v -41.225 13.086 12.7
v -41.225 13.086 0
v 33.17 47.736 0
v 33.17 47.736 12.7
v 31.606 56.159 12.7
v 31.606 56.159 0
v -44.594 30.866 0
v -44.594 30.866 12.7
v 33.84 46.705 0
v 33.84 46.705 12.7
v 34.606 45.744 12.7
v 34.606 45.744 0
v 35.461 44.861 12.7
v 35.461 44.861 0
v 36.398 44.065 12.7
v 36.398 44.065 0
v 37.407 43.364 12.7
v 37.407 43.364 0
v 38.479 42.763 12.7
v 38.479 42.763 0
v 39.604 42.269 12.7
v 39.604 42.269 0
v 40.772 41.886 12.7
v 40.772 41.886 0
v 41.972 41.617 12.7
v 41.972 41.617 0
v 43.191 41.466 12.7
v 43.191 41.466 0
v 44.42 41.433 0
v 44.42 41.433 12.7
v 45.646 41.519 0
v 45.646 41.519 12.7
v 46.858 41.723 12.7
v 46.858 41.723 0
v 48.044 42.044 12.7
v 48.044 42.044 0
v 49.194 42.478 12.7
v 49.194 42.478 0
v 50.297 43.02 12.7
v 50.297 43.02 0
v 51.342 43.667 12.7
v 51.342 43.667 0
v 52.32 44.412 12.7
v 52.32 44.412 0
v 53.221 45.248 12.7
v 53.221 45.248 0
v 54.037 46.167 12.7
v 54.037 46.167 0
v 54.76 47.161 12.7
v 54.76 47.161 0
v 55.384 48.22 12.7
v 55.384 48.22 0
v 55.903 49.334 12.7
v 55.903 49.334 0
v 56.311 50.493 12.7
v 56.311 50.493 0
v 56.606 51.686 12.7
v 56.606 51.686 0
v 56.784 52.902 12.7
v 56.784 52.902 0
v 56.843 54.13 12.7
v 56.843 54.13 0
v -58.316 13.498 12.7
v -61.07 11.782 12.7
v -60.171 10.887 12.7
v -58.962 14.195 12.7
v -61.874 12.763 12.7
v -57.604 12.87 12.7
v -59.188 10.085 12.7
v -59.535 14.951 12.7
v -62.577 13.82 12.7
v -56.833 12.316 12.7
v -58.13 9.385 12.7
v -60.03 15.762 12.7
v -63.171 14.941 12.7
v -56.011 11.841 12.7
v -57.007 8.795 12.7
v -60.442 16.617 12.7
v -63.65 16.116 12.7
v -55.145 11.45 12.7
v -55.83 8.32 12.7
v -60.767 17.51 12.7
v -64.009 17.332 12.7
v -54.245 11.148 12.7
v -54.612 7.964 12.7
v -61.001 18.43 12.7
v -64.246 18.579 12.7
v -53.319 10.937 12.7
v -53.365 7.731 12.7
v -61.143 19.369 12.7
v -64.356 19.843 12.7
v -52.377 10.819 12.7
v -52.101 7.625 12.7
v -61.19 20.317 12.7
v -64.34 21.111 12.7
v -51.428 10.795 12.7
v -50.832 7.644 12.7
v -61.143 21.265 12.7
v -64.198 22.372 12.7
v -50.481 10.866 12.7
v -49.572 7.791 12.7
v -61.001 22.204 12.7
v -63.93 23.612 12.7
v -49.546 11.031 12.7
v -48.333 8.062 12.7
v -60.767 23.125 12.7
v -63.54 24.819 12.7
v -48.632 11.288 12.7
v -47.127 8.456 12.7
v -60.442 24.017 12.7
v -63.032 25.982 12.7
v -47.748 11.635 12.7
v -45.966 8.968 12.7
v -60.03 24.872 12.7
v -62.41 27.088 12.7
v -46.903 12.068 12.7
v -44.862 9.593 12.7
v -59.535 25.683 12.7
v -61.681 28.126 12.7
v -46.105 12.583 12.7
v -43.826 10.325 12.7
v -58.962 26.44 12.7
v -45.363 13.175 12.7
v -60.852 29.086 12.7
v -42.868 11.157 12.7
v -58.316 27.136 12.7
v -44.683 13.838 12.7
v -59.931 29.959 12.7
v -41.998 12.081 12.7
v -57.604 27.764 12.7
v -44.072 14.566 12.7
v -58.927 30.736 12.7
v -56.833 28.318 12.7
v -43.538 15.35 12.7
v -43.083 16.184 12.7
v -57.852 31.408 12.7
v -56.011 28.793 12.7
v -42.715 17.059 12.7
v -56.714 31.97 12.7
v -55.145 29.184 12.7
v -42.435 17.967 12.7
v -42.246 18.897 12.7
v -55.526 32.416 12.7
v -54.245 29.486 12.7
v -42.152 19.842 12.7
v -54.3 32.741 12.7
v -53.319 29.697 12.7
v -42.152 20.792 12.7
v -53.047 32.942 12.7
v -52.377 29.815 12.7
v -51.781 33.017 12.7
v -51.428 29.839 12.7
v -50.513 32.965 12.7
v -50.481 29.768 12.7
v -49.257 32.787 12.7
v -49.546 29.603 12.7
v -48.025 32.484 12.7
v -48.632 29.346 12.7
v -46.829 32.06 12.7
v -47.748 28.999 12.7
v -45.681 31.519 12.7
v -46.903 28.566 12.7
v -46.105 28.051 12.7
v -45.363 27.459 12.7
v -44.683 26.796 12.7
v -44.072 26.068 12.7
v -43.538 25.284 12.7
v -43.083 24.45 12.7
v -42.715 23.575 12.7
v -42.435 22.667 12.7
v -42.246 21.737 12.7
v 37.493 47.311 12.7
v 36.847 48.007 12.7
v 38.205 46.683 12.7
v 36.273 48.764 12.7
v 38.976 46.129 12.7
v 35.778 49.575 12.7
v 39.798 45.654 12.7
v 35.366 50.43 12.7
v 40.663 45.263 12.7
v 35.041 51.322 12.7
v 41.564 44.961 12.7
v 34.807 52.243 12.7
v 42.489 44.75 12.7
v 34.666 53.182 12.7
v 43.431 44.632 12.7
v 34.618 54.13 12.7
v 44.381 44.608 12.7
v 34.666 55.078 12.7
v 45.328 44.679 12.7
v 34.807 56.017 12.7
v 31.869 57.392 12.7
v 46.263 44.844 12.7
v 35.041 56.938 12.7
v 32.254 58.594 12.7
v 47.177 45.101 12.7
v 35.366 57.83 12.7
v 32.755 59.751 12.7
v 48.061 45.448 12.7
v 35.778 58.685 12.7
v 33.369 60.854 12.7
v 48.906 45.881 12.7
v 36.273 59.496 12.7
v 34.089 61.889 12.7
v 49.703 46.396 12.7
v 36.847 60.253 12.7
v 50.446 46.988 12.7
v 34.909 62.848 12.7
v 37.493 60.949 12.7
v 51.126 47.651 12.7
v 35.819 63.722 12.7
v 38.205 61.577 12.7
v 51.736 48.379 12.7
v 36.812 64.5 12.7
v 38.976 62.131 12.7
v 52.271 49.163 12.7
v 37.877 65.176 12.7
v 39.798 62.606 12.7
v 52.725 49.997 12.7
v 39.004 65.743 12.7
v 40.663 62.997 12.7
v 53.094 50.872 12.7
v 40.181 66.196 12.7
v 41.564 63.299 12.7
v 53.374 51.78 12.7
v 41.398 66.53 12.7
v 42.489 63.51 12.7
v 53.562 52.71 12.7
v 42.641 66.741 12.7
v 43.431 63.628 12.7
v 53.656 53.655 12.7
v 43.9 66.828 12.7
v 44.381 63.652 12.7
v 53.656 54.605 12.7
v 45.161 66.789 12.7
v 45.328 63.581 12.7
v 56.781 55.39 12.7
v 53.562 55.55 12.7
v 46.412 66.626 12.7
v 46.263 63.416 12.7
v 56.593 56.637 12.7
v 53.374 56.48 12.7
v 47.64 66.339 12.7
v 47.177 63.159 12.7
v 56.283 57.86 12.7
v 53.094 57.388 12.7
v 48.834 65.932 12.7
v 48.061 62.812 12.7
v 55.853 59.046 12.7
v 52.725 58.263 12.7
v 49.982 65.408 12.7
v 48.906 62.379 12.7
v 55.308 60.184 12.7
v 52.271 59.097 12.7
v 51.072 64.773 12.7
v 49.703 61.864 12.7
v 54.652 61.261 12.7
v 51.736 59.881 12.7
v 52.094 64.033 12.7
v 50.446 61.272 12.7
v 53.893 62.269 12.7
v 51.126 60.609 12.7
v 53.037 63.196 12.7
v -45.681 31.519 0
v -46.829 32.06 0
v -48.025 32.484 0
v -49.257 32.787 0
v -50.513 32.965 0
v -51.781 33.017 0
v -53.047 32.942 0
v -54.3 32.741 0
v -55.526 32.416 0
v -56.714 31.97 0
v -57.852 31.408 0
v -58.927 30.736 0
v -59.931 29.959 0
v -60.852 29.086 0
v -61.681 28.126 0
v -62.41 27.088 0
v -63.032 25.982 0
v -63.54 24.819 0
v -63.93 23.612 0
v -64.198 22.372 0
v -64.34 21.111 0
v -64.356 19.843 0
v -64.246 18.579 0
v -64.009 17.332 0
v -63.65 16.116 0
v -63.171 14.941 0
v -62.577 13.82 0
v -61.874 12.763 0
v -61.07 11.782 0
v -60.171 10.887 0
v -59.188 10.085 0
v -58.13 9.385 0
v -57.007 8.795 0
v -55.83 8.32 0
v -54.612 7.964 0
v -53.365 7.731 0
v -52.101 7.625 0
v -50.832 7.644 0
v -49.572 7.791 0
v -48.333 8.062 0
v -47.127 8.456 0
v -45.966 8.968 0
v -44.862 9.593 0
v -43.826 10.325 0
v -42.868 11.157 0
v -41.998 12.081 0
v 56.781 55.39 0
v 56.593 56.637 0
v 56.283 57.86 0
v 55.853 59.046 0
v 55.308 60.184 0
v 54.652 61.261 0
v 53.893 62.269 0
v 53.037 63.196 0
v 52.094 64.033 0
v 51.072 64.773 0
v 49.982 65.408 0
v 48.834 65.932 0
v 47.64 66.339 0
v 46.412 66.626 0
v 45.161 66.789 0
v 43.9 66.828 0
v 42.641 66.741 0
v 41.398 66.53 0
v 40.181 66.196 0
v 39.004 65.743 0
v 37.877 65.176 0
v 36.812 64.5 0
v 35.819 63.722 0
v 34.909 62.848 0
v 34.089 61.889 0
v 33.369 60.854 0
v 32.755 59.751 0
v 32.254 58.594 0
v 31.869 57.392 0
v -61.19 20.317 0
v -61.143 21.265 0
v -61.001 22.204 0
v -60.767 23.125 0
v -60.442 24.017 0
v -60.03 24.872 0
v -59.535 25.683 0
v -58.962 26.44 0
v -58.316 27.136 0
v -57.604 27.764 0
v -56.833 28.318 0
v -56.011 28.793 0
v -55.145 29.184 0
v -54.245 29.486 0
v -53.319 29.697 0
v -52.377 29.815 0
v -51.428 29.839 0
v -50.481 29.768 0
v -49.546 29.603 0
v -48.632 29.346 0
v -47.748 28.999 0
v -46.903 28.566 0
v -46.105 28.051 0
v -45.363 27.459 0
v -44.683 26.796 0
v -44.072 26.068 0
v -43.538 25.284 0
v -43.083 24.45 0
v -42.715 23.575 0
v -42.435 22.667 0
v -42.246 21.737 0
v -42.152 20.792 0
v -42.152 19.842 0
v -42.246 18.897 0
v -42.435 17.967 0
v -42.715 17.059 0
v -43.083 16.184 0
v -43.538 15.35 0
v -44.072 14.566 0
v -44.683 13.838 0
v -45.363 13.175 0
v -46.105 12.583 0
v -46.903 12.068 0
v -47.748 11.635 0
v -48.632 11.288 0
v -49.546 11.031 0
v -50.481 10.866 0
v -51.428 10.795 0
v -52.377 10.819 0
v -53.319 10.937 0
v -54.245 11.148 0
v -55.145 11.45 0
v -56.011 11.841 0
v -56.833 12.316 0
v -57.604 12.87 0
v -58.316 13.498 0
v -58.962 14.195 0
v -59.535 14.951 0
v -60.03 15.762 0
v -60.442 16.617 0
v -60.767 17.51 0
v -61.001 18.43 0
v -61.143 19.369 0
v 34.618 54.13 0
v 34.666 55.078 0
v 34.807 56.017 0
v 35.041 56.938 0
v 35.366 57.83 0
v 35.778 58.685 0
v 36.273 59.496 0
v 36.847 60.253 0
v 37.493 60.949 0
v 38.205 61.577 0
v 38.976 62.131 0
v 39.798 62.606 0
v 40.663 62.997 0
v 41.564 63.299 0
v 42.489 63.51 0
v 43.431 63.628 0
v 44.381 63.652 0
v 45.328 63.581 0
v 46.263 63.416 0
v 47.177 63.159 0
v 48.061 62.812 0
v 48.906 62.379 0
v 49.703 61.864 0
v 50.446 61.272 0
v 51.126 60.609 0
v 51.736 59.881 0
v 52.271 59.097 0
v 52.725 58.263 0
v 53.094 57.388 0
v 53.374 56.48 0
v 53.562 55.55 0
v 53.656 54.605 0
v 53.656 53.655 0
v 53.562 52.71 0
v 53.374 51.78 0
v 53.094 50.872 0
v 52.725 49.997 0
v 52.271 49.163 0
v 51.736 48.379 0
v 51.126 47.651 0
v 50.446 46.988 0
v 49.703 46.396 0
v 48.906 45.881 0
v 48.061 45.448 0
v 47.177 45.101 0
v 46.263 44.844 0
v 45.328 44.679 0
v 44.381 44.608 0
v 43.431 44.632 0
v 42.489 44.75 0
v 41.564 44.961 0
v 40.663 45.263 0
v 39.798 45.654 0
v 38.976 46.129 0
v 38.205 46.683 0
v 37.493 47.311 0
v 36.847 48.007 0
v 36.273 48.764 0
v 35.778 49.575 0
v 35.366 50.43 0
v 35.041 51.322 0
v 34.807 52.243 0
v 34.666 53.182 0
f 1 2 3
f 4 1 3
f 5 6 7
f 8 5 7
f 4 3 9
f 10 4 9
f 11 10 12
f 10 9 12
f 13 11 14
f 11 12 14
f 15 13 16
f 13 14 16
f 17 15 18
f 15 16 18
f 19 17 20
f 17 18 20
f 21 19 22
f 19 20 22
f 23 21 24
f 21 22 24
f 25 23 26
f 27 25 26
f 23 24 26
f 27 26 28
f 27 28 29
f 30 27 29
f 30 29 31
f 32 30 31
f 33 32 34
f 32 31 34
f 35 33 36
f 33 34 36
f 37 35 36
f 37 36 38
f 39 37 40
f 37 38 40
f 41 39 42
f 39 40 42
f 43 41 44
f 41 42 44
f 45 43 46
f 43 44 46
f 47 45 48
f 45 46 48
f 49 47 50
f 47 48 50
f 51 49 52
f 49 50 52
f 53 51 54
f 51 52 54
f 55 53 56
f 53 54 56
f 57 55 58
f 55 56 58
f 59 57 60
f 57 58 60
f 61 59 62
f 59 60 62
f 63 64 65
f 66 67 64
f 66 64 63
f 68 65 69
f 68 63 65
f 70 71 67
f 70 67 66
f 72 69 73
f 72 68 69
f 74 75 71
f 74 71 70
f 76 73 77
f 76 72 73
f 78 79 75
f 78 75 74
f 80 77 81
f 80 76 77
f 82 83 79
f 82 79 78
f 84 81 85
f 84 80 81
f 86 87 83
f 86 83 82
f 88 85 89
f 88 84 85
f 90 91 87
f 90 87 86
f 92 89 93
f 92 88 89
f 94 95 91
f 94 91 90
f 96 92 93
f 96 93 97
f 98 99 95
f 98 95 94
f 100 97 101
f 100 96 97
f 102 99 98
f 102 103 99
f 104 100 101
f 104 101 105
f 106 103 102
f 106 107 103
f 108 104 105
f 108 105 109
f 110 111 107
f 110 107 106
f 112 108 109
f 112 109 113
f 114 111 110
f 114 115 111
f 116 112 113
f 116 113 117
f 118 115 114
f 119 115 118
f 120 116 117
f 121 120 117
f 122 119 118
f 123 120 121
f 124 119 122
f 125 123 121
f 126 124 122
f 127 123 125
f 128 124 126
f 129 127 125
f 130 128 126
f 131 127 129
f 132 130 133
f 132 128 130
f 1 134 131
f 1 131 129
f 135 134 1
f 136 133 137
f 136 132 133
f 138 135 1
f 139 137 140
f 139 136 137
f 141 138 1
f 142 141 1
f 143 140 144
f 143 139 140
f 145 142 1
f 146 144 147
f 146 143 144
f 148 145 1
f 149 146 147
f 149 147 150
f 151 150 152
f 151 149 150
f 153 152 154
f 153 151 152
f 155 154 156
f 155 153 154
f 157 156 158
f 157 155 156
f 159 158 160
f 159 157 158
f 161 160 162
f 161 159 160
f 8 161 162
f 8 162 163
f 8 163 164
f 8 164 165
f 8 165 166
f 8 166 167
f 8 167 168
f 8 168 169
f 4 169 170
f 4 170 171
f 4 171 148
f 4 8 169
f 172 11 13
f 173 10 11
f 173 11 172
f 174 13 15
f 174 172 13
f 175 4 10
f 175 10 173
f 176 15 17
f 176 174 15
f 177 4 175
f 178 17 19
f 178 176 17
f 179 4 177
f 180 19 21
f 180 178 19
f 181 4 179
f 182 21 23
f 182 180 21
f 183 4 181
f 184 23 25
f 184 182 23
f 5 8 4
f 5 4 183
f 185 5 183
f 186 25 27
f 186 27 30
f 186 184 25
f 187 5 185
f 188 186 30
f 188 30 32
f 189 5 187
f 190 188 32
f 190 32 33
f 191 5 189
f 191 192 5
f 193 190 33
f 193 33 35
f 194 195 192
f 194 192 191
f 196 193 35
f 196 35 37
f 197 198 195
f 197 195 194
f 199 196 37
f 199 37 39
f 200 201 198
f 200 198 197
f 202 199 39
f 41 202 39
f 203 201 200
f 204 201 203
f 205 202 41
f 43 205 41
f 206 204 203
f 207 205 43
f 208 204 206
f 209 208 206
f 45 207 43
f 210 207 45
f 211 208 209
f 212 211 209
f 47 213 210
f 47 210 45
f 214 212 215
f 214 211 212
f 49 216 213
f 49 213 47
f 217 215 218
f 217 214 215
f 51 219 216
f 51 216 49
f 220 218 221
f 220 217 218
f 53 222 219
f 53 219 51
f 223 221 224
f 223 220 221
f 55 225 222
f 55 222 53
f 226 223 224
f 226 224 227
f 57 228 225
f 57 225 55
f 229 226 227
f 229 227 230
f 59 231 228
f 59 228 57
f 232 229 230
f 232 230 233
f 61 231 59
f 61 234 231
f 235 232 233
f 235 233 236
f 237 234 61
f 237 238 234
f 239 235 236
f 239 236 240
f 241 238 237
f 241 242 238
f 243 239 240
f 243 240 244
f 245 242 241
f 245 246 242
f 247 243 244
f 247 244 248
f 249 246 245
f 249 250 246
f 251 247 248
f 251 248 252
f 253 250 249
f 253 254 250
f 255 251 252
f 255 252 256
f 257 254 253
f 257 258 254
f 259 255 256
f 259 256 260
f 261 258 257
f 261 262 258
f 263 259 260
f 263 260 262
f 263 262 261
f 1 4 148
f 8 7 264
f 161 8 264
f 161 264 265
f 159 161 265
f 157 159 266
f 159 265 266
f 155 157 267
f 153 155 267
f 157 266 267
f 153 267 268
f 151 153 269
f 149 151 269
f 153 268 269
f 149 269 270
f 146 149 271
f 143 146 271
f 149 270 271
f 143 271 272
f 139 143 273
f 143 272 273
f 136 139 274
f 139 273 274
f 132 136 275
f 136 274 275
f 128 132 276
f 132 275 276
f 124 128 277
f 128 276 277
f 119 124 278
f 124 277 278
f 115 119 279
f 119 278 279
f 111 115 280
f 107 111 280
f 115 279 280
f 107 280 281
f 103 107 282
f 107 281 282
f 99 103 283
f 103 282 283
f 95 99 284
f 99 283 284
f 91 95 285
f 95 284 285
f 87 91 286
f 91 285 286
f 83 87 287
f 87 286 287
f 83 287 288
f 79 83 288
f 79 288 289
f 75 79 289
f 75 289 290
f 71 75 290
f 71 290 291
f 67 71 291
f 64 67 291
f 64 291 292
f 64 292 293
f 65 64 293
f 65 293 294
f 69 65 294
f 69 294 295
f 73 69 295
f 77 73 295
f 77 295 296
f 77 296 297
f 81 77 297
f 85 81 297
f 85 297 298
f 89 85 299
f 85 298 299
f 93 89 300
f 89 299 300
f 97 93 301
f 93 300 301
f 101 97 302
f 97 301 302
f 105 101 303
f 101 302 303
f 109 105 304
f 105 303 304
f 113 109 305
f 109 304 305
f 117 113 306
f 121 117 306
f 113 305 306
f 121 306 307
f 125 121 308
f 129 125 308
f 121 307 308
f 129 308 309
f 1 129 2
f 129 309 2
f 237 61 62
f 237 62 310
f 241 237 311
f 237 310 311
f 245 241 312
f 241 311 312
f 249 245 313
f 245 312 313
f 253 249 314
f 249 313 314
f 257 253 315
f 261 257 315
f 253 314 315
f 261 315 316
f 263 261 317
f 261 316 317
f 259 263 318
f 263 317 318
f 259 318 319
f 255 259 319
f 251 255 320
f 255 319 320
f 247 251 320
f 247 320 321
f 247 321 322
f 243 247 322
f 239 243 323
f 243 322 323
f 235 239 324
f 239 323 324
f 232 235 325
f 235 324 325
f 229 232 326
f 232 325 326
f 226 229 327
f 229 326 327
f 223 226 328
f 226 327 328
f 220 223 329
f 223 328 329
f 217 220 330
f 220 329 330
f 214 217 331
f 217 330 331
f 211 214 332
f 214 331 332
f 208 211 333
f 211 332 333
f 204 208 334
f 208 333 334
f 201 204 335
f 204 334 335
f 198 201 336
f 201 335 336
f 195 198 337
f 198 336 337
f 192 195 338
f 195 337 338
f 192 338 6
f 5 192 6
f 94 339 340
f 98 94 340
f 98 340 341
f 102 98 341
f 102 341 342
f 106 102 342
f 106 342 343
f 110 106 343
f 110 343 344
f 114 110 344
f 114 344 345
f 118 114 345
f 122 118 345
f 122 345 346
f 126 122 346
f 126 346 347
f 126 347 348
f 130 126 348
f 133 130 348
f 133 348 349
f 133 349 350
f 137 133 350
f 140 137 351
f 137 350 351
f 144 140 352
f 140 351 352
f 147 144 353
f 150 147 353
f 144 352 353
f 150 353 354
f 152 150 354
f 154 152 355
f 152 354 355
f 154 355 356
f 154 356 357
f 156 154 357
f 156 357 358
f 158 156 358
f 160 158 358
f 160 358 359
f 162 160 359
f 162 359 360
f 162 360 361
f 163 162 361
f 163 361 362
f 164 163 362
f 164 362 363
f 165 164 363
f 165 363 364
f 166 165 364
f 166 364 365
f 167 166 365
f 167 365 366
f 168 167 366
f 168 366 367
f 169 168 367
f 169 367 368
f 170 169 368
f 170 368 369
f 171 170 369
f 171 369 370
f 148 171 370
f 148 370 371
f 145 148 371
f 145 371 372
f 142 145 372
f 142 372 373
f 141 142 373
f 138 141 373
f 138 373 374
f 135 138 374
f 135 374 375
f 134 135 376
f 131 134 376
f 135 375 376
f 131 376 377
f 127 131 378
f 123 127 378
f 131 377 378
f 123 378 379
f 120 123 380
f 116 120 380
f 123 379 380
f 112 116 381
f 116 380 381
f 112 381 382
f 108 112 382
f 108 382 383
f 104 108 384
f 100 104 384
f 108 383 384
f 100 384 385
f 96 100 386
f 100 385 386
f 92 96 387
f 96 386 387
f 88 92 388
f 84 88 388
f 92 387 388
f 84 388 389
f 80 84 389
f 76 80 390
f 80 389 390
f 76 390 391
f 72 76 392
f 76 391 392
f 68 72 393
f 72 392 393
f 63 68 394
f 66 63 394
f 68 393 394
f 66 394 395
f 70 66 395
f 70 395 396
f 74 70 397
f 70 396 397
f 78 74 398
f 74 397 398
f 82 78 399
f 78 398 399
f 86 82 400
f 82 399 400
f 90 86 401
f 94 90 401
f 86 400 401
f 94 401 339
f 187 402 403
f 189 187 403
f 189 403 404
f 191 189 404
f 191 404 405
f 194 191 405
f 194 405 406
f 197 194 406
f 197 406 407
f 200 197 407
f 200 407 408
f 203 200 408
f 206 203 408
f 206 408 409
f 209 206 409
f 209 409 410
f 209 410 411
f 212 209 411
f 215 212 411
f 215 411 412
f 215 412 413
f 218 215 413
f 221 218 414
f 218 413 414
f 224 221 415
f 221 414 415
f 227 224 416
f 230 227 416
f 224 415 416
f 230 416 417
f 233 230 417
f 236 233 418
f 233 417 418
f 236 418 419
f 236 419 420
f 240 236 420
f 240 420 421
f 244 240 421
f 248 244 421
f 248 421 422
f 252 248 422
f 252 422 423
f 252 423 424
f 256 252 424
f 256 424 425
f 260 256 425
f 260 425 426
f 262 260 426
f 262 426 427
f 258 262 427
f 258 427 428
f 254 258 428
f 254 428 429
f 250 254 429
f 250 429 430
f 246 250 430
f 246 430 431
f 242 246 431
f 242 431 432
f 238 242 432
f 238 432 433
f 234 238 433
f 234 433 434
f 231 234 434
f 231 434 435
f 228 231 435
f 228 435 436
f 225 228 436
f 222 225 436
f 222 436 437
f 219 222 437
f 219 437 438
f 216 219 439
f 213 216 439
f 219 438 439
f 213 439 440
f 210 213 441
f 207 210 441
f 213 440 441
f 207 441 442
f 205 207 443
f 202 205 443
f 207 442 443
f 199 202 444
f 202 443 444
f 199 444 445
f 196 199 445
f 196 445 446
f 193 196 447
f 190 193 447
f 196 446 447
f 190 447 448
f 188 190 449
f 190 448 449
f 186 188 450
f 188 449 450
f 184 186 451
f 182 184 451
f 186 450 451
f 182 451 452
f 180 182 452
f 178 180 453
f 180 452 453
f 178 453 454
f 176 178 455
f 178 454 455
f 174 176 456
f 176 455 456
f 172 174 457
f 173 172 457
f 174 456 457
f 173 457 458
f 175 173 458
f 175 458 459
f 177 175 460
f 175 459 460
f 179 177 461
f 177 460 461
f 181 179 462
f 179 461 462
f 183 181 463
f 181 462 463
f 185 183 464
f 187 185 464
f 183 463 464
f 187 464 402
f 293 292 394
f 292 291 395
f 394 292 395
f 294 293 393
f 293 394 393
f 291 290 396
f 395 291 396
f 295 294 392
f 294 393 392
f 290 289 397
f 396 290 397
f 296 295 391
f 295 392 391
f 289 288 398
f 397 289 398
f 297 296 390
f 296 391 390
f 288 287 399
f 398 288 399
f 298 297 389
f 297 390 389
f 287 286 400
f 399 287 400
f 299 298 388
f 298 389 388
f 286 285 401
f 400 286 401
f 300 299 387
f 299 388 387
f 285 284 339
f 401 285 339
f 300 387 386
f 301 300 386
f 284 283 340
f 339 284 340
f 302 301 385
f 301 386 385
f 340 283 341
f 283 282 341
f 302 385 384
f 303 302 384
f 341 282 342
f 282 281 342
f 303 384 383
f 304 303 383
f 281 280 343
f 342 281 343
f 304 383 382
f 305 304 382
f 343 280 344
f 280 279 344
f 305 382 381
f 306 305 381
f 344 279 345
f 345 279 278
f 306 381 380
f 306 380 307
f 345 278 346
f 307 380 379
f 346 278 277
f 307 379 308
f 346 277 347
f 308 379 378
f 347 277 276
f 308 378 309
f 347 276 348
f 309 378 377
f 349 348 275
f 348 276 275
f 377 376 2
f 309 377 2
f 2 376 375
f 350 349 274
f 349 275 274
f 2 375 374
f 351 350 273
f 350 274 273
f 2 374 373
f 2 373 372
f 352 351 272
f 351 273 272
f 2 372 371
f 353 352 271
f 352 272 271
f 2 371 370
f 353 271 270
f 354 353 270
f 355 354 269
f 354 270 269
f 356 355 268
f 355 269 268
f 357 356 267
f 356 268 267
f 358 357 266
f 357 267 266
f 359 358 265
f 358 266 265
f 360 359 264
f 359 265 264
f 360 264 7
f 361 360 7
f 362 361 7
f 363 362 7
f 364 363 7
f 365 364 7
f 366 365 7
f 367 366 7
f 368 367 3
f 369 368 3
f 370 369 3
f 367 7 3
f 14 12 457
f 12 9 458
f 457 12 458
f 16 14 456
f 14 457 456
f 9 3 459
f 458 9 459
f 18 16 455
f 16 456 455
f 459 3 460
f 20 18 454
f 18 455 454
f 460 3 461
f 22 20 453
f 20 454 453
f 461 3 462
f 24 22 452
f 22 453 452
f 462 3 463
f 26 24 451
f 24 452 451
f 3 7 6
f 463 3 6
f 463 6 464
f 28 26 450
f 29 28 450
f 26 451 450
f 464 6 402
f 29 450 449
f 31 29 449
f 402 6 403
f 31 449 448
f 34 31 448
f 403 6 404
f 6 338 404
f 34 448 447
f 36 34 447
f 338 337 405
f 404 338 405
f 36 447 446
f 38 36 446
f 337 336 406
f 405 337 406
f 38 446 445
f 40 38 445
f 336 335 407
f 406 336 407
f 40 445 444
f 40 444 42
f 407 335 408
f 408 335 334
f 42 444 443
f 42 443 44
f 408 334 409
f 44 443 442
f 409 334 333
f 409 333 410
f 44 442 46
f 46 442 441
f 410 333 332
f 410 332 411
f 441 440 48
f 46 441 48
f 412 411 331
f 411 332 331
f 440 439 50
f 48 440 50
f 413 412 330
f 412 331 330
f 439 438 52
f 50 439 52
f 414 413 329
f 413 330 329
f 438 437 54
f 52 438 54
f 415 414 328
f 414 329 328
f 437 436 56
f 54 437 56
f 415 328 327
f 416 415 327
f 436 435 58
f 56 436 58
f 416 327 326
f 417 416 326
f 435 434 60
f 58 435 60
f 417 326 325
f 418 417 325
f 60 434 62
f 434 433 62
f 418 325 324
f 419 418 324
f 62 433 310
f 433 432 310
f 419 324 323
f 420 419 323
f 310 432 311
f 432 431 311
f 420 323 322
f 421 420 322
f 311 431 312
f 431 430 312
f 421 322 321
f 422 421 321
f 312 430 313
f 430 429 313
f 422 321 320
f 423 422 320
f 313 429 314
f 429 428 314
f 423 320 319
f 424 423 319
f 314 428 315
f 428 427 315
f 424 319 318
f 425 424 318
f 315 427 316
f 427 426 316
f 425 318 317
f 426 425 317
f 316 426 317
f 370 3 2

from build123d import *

# Parameters (mm, degrees)
F1_DEPTH = 12.7
F3_D     = 19.05


with BuildPart() as f1:
    # F0 (on Top) → F1 (new body)
    with BuildSketch(Plane.XY):
        with BuildLine():
            ThreePointArc((-41.224553, 13.086214), (-39.543115, 16.529238), (-38.965097, 20.317053))
            ThreePointArc((-38.965097, 20.317053), (-40.460249, 26.295463), (-44.593661, 30.866214))
            ThreePointArc((-44.593661, 30.866214), (-64.143057, 17.952622), (-41.224553, 13.086214))
        make_face()
        with BuildLine():
            ThreePointArc((-44.593661, 30.866214), (-40.460249, 26.295463), (-38.965097, 20.317053))
            ThreePointArc((-38.965097, 20.317053), (-39.543115, 16.529238), (-41.224553, 13.086214))
            Line((-41.224553, 13.086214), (33.170466, 47.735668))
            ThreePointArc((33.170466, 47.735668), (31.656753, 51.811239), (31.606339, 56.158545))
            Line((31.606339, 56.158545), (-44.593661, 30.866214))
        make_face()
        with BuildLine():
            ThreePointArc((56.843282, 54.129986), (45.160833, 66.789156), (31.606339, 56.158545))
            ThreePointArc((31.606339, 56.158545), (31.656753, 51.811239), (33.170466, 47.735668))
            ThreePointArc((33.170466, 47.735668), (47.455021, 41.869383), (56.843282, 54.129986))
        make_face()
    extrude(amount=F1_DEPTH)

    # F3 (through all)
    with Locations(Plane.XY.offset(12.7)):
        with Locations((-51.665097, 20.317053), (44.143282, 54.129986)):
            Hole(F3_D / 2)


solid = f1.part
